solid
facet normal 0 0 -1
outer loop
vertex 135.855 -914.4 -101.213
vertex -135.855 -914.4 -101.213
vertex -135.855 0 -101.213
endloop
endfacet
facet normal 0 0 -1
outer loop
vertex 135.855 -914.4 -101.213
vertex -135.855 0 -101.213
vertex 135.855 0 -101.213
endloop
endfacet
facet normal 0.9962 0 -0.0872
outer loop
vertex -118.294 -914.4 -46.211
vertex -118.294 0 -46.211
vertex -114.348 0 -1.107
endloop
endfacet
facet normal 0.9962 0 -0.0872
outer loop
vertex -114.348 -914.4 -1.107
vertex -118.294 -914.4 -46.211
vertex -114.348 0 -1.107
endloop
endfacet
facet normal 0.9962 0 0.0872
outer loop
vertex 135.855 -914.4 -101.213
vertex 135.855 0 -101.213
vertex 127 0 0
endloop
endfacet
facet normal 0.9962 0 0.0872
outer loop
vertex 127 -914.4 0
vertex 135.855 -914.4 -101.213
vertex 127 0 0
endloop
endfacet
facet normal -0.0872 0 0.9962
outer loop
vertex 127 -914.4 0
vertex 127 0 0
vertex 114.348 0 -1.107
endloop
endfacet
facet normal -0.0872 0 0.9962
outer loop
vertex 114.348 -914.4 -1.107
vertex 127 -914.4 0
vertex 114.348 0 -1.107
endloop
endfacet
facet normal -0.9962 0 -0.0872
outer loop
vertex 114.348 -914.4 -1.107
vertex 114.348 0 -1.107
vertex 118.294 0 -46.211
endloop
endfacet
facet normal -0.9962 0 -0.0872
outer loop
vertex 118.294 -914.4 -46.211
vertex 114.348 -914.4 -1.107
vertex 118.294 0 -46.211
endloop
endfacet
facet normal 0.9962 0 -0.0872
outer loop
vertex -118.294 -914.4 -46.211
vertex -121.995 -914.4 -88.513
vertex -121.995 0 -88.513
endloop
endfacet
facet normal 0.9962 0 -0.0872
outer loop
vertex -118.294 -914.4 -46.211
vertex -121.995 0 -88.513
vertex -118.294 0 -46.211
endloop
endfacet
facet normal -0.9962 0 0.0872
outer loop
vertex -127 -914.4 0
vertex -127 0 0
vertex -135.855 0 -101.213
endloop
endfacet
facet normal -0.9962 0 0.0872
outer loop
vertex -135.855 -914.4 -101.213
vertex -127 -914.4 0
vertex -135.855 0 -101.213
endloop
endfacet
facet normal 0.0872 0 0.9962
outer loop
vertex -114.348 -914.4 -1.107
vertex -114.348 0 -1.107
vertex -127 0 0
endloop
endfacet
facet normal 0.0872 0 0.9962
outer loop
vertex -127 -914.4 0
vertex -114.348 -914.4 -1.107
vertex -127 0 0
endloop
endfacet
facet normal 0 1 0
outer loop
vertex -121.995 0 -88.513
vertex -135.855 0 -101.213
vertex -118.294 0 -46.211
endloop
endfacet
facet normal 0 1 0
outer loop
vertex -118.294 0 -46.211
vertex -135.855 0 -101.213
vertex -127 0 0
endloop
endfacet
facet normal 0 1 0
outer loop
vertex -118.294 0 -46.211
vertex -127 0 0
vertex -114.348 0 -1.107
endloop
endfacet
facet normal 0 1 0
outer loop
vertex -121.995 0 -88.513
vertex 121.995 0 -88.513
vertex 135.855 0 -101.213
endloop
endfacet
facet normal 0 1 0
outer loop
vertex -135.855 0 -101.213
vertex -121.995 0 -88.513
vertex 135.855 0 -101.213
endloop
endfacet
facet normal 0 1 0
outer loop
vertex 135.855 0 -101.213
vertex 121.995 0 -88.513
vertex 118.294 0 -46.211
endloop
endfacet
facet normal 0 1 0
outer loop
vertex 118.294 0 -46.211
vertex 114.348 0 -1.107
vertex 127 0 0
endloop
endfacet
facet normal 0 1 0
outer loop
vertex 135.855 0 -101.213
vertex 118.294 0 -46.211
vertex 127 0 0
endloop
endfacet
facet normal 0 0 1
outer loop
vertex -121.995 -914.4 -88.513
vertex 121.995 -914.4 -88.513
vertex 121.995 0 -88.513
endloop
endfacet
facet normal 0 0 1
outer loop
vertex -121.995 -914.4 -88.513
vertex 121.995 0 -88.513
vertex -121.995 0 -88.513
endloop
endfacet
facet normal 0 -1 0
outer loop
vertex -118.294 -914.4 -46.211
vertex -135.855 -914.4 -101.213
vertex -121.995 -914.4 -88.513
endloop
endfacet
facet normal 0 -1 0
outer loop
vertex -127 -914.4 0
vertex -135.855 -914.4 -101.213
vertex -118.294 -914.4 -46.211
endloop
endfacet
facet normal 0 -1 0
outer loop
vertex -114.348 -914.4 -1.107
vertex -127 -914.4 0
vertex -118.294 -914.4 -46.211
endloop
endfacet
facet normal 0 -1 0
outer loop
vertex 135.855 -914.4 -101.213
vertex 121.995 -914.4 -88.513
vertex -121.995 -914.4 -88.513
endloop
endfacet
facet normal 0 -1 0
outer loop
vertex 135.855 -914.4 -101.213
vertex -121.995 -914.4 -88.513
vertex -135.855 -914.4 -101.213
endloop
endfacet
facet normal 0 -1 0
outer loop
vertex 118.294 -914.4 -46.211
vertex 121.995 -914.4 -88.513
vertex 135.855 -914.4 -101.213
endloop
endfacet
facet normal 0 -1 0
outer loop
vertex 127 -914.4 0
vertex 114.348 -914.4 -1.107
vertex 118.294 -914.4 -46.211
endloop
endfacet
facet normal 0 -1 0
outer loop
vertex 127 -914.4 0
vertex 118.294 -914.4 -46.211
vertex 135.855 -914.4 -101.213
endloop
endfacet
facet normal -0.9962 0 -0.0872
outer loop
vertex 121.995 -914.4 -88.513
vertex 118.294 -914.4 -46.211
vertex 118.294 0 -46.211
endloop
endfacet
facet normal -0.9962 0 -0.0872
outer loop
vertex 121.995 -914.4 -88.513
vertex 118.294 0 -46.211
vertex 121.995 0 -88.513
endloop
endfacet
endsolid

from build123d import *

# Parameters (mm, degrees)
F1_DEPTH = 914.4


with BuildPart() as f1:
    # F0 (on Front) → F1 (new body)
    with BuildSketch(Plane.XZ):
        with BuildLine():
            Line((-114.3483273342, -1.1068779329), (-127, 0))
            ThreePointArc((-127, 0), (-124.8046262141, -23.5118114054), (-118.2944051093, -46.2107532923))
            Line((-118.2944051093, -46.2107532923), (-114.3483273342, -1.1068779329))
        make_face()
        with BuildLine():
            ThreePointArc((-118.2944051093, -46.2107532923), (-124.8046262141, -23.5118114054), (-127, 0))
            Line((-127, 0), (-135.8550234632, -101.2133813261))
            Line((-135.8550234632, -101.2133813261), (-76.7127853785, -101.2133813261))
            ThreePointArc((-76.7127853785, -101.2133813261), (-84.1331171102, -95.134739214), (-91.0734940925, -88.5133813261))
            Line((-91.0734940925, -88.5133813261), (-121.9954054996, -88.5133813261))
            Line((-121.9954054996, -88.5133813261), (-118.2944051093, -46.2107532923))
        make_face()
        with BuildLine():
            ThreePointArc((76.7127853785, -101.2133813261), (84.1331171102, -95.134739214), (91.0734940925, -88.5133813261))
            Line((91.0734940925, -88.5133813261), (0, -88.5133813261))
            Line((0, -88.5133813261), (-91.0734940925, -88.5133813261))
            ThreePointArc((-91.0734940925, -88.5133813261), (-84.1331171102, -95.134739214), (-76.7127853785, -101.2133813261))
            Line((-76.7127853785, -101.2133813261), (0, -101.2133813261))
            Line((0, -101.2133813261), (76.7127853785, -101.2133813261))
        make_face()
        with BuildLine():
            Line((135.8550234632, -101.2133813261), (127, 0))
            ThreePointArc((127, 0), (124.8046262141, -23.5118114054), (118.2944051093, -46.2107532923))
            Line((118.2944051093, -46.2107532923), (121.9954054996, -88.5133813261))
            Line((121.9954054996, -88.5133813261), (91.0734940925, -88.5133813261))
            ThreePointArc((91.0734940925, -88.5133813261), (84.1331171102, -95.134739214), (76.7127853785, -101.2133813261))
            Line((76.7127853785, -101.2133813261), (135.8550234632, -101.2133813261))
        make_face()
        with BuildLine():
            ThreePointArc((118.2944051093, -46.2107532923), (124.8046262141, -23.5118114054), (127, 0))
            Line((127, 0), (114.3483273342, -1.1068779329))
            Line((114.3483273342, -1.1068779329), (118.2944051093, -46.2107532923))
        make_face()
    extrude(amount=F1_DEPTH)


solid = f1.part
